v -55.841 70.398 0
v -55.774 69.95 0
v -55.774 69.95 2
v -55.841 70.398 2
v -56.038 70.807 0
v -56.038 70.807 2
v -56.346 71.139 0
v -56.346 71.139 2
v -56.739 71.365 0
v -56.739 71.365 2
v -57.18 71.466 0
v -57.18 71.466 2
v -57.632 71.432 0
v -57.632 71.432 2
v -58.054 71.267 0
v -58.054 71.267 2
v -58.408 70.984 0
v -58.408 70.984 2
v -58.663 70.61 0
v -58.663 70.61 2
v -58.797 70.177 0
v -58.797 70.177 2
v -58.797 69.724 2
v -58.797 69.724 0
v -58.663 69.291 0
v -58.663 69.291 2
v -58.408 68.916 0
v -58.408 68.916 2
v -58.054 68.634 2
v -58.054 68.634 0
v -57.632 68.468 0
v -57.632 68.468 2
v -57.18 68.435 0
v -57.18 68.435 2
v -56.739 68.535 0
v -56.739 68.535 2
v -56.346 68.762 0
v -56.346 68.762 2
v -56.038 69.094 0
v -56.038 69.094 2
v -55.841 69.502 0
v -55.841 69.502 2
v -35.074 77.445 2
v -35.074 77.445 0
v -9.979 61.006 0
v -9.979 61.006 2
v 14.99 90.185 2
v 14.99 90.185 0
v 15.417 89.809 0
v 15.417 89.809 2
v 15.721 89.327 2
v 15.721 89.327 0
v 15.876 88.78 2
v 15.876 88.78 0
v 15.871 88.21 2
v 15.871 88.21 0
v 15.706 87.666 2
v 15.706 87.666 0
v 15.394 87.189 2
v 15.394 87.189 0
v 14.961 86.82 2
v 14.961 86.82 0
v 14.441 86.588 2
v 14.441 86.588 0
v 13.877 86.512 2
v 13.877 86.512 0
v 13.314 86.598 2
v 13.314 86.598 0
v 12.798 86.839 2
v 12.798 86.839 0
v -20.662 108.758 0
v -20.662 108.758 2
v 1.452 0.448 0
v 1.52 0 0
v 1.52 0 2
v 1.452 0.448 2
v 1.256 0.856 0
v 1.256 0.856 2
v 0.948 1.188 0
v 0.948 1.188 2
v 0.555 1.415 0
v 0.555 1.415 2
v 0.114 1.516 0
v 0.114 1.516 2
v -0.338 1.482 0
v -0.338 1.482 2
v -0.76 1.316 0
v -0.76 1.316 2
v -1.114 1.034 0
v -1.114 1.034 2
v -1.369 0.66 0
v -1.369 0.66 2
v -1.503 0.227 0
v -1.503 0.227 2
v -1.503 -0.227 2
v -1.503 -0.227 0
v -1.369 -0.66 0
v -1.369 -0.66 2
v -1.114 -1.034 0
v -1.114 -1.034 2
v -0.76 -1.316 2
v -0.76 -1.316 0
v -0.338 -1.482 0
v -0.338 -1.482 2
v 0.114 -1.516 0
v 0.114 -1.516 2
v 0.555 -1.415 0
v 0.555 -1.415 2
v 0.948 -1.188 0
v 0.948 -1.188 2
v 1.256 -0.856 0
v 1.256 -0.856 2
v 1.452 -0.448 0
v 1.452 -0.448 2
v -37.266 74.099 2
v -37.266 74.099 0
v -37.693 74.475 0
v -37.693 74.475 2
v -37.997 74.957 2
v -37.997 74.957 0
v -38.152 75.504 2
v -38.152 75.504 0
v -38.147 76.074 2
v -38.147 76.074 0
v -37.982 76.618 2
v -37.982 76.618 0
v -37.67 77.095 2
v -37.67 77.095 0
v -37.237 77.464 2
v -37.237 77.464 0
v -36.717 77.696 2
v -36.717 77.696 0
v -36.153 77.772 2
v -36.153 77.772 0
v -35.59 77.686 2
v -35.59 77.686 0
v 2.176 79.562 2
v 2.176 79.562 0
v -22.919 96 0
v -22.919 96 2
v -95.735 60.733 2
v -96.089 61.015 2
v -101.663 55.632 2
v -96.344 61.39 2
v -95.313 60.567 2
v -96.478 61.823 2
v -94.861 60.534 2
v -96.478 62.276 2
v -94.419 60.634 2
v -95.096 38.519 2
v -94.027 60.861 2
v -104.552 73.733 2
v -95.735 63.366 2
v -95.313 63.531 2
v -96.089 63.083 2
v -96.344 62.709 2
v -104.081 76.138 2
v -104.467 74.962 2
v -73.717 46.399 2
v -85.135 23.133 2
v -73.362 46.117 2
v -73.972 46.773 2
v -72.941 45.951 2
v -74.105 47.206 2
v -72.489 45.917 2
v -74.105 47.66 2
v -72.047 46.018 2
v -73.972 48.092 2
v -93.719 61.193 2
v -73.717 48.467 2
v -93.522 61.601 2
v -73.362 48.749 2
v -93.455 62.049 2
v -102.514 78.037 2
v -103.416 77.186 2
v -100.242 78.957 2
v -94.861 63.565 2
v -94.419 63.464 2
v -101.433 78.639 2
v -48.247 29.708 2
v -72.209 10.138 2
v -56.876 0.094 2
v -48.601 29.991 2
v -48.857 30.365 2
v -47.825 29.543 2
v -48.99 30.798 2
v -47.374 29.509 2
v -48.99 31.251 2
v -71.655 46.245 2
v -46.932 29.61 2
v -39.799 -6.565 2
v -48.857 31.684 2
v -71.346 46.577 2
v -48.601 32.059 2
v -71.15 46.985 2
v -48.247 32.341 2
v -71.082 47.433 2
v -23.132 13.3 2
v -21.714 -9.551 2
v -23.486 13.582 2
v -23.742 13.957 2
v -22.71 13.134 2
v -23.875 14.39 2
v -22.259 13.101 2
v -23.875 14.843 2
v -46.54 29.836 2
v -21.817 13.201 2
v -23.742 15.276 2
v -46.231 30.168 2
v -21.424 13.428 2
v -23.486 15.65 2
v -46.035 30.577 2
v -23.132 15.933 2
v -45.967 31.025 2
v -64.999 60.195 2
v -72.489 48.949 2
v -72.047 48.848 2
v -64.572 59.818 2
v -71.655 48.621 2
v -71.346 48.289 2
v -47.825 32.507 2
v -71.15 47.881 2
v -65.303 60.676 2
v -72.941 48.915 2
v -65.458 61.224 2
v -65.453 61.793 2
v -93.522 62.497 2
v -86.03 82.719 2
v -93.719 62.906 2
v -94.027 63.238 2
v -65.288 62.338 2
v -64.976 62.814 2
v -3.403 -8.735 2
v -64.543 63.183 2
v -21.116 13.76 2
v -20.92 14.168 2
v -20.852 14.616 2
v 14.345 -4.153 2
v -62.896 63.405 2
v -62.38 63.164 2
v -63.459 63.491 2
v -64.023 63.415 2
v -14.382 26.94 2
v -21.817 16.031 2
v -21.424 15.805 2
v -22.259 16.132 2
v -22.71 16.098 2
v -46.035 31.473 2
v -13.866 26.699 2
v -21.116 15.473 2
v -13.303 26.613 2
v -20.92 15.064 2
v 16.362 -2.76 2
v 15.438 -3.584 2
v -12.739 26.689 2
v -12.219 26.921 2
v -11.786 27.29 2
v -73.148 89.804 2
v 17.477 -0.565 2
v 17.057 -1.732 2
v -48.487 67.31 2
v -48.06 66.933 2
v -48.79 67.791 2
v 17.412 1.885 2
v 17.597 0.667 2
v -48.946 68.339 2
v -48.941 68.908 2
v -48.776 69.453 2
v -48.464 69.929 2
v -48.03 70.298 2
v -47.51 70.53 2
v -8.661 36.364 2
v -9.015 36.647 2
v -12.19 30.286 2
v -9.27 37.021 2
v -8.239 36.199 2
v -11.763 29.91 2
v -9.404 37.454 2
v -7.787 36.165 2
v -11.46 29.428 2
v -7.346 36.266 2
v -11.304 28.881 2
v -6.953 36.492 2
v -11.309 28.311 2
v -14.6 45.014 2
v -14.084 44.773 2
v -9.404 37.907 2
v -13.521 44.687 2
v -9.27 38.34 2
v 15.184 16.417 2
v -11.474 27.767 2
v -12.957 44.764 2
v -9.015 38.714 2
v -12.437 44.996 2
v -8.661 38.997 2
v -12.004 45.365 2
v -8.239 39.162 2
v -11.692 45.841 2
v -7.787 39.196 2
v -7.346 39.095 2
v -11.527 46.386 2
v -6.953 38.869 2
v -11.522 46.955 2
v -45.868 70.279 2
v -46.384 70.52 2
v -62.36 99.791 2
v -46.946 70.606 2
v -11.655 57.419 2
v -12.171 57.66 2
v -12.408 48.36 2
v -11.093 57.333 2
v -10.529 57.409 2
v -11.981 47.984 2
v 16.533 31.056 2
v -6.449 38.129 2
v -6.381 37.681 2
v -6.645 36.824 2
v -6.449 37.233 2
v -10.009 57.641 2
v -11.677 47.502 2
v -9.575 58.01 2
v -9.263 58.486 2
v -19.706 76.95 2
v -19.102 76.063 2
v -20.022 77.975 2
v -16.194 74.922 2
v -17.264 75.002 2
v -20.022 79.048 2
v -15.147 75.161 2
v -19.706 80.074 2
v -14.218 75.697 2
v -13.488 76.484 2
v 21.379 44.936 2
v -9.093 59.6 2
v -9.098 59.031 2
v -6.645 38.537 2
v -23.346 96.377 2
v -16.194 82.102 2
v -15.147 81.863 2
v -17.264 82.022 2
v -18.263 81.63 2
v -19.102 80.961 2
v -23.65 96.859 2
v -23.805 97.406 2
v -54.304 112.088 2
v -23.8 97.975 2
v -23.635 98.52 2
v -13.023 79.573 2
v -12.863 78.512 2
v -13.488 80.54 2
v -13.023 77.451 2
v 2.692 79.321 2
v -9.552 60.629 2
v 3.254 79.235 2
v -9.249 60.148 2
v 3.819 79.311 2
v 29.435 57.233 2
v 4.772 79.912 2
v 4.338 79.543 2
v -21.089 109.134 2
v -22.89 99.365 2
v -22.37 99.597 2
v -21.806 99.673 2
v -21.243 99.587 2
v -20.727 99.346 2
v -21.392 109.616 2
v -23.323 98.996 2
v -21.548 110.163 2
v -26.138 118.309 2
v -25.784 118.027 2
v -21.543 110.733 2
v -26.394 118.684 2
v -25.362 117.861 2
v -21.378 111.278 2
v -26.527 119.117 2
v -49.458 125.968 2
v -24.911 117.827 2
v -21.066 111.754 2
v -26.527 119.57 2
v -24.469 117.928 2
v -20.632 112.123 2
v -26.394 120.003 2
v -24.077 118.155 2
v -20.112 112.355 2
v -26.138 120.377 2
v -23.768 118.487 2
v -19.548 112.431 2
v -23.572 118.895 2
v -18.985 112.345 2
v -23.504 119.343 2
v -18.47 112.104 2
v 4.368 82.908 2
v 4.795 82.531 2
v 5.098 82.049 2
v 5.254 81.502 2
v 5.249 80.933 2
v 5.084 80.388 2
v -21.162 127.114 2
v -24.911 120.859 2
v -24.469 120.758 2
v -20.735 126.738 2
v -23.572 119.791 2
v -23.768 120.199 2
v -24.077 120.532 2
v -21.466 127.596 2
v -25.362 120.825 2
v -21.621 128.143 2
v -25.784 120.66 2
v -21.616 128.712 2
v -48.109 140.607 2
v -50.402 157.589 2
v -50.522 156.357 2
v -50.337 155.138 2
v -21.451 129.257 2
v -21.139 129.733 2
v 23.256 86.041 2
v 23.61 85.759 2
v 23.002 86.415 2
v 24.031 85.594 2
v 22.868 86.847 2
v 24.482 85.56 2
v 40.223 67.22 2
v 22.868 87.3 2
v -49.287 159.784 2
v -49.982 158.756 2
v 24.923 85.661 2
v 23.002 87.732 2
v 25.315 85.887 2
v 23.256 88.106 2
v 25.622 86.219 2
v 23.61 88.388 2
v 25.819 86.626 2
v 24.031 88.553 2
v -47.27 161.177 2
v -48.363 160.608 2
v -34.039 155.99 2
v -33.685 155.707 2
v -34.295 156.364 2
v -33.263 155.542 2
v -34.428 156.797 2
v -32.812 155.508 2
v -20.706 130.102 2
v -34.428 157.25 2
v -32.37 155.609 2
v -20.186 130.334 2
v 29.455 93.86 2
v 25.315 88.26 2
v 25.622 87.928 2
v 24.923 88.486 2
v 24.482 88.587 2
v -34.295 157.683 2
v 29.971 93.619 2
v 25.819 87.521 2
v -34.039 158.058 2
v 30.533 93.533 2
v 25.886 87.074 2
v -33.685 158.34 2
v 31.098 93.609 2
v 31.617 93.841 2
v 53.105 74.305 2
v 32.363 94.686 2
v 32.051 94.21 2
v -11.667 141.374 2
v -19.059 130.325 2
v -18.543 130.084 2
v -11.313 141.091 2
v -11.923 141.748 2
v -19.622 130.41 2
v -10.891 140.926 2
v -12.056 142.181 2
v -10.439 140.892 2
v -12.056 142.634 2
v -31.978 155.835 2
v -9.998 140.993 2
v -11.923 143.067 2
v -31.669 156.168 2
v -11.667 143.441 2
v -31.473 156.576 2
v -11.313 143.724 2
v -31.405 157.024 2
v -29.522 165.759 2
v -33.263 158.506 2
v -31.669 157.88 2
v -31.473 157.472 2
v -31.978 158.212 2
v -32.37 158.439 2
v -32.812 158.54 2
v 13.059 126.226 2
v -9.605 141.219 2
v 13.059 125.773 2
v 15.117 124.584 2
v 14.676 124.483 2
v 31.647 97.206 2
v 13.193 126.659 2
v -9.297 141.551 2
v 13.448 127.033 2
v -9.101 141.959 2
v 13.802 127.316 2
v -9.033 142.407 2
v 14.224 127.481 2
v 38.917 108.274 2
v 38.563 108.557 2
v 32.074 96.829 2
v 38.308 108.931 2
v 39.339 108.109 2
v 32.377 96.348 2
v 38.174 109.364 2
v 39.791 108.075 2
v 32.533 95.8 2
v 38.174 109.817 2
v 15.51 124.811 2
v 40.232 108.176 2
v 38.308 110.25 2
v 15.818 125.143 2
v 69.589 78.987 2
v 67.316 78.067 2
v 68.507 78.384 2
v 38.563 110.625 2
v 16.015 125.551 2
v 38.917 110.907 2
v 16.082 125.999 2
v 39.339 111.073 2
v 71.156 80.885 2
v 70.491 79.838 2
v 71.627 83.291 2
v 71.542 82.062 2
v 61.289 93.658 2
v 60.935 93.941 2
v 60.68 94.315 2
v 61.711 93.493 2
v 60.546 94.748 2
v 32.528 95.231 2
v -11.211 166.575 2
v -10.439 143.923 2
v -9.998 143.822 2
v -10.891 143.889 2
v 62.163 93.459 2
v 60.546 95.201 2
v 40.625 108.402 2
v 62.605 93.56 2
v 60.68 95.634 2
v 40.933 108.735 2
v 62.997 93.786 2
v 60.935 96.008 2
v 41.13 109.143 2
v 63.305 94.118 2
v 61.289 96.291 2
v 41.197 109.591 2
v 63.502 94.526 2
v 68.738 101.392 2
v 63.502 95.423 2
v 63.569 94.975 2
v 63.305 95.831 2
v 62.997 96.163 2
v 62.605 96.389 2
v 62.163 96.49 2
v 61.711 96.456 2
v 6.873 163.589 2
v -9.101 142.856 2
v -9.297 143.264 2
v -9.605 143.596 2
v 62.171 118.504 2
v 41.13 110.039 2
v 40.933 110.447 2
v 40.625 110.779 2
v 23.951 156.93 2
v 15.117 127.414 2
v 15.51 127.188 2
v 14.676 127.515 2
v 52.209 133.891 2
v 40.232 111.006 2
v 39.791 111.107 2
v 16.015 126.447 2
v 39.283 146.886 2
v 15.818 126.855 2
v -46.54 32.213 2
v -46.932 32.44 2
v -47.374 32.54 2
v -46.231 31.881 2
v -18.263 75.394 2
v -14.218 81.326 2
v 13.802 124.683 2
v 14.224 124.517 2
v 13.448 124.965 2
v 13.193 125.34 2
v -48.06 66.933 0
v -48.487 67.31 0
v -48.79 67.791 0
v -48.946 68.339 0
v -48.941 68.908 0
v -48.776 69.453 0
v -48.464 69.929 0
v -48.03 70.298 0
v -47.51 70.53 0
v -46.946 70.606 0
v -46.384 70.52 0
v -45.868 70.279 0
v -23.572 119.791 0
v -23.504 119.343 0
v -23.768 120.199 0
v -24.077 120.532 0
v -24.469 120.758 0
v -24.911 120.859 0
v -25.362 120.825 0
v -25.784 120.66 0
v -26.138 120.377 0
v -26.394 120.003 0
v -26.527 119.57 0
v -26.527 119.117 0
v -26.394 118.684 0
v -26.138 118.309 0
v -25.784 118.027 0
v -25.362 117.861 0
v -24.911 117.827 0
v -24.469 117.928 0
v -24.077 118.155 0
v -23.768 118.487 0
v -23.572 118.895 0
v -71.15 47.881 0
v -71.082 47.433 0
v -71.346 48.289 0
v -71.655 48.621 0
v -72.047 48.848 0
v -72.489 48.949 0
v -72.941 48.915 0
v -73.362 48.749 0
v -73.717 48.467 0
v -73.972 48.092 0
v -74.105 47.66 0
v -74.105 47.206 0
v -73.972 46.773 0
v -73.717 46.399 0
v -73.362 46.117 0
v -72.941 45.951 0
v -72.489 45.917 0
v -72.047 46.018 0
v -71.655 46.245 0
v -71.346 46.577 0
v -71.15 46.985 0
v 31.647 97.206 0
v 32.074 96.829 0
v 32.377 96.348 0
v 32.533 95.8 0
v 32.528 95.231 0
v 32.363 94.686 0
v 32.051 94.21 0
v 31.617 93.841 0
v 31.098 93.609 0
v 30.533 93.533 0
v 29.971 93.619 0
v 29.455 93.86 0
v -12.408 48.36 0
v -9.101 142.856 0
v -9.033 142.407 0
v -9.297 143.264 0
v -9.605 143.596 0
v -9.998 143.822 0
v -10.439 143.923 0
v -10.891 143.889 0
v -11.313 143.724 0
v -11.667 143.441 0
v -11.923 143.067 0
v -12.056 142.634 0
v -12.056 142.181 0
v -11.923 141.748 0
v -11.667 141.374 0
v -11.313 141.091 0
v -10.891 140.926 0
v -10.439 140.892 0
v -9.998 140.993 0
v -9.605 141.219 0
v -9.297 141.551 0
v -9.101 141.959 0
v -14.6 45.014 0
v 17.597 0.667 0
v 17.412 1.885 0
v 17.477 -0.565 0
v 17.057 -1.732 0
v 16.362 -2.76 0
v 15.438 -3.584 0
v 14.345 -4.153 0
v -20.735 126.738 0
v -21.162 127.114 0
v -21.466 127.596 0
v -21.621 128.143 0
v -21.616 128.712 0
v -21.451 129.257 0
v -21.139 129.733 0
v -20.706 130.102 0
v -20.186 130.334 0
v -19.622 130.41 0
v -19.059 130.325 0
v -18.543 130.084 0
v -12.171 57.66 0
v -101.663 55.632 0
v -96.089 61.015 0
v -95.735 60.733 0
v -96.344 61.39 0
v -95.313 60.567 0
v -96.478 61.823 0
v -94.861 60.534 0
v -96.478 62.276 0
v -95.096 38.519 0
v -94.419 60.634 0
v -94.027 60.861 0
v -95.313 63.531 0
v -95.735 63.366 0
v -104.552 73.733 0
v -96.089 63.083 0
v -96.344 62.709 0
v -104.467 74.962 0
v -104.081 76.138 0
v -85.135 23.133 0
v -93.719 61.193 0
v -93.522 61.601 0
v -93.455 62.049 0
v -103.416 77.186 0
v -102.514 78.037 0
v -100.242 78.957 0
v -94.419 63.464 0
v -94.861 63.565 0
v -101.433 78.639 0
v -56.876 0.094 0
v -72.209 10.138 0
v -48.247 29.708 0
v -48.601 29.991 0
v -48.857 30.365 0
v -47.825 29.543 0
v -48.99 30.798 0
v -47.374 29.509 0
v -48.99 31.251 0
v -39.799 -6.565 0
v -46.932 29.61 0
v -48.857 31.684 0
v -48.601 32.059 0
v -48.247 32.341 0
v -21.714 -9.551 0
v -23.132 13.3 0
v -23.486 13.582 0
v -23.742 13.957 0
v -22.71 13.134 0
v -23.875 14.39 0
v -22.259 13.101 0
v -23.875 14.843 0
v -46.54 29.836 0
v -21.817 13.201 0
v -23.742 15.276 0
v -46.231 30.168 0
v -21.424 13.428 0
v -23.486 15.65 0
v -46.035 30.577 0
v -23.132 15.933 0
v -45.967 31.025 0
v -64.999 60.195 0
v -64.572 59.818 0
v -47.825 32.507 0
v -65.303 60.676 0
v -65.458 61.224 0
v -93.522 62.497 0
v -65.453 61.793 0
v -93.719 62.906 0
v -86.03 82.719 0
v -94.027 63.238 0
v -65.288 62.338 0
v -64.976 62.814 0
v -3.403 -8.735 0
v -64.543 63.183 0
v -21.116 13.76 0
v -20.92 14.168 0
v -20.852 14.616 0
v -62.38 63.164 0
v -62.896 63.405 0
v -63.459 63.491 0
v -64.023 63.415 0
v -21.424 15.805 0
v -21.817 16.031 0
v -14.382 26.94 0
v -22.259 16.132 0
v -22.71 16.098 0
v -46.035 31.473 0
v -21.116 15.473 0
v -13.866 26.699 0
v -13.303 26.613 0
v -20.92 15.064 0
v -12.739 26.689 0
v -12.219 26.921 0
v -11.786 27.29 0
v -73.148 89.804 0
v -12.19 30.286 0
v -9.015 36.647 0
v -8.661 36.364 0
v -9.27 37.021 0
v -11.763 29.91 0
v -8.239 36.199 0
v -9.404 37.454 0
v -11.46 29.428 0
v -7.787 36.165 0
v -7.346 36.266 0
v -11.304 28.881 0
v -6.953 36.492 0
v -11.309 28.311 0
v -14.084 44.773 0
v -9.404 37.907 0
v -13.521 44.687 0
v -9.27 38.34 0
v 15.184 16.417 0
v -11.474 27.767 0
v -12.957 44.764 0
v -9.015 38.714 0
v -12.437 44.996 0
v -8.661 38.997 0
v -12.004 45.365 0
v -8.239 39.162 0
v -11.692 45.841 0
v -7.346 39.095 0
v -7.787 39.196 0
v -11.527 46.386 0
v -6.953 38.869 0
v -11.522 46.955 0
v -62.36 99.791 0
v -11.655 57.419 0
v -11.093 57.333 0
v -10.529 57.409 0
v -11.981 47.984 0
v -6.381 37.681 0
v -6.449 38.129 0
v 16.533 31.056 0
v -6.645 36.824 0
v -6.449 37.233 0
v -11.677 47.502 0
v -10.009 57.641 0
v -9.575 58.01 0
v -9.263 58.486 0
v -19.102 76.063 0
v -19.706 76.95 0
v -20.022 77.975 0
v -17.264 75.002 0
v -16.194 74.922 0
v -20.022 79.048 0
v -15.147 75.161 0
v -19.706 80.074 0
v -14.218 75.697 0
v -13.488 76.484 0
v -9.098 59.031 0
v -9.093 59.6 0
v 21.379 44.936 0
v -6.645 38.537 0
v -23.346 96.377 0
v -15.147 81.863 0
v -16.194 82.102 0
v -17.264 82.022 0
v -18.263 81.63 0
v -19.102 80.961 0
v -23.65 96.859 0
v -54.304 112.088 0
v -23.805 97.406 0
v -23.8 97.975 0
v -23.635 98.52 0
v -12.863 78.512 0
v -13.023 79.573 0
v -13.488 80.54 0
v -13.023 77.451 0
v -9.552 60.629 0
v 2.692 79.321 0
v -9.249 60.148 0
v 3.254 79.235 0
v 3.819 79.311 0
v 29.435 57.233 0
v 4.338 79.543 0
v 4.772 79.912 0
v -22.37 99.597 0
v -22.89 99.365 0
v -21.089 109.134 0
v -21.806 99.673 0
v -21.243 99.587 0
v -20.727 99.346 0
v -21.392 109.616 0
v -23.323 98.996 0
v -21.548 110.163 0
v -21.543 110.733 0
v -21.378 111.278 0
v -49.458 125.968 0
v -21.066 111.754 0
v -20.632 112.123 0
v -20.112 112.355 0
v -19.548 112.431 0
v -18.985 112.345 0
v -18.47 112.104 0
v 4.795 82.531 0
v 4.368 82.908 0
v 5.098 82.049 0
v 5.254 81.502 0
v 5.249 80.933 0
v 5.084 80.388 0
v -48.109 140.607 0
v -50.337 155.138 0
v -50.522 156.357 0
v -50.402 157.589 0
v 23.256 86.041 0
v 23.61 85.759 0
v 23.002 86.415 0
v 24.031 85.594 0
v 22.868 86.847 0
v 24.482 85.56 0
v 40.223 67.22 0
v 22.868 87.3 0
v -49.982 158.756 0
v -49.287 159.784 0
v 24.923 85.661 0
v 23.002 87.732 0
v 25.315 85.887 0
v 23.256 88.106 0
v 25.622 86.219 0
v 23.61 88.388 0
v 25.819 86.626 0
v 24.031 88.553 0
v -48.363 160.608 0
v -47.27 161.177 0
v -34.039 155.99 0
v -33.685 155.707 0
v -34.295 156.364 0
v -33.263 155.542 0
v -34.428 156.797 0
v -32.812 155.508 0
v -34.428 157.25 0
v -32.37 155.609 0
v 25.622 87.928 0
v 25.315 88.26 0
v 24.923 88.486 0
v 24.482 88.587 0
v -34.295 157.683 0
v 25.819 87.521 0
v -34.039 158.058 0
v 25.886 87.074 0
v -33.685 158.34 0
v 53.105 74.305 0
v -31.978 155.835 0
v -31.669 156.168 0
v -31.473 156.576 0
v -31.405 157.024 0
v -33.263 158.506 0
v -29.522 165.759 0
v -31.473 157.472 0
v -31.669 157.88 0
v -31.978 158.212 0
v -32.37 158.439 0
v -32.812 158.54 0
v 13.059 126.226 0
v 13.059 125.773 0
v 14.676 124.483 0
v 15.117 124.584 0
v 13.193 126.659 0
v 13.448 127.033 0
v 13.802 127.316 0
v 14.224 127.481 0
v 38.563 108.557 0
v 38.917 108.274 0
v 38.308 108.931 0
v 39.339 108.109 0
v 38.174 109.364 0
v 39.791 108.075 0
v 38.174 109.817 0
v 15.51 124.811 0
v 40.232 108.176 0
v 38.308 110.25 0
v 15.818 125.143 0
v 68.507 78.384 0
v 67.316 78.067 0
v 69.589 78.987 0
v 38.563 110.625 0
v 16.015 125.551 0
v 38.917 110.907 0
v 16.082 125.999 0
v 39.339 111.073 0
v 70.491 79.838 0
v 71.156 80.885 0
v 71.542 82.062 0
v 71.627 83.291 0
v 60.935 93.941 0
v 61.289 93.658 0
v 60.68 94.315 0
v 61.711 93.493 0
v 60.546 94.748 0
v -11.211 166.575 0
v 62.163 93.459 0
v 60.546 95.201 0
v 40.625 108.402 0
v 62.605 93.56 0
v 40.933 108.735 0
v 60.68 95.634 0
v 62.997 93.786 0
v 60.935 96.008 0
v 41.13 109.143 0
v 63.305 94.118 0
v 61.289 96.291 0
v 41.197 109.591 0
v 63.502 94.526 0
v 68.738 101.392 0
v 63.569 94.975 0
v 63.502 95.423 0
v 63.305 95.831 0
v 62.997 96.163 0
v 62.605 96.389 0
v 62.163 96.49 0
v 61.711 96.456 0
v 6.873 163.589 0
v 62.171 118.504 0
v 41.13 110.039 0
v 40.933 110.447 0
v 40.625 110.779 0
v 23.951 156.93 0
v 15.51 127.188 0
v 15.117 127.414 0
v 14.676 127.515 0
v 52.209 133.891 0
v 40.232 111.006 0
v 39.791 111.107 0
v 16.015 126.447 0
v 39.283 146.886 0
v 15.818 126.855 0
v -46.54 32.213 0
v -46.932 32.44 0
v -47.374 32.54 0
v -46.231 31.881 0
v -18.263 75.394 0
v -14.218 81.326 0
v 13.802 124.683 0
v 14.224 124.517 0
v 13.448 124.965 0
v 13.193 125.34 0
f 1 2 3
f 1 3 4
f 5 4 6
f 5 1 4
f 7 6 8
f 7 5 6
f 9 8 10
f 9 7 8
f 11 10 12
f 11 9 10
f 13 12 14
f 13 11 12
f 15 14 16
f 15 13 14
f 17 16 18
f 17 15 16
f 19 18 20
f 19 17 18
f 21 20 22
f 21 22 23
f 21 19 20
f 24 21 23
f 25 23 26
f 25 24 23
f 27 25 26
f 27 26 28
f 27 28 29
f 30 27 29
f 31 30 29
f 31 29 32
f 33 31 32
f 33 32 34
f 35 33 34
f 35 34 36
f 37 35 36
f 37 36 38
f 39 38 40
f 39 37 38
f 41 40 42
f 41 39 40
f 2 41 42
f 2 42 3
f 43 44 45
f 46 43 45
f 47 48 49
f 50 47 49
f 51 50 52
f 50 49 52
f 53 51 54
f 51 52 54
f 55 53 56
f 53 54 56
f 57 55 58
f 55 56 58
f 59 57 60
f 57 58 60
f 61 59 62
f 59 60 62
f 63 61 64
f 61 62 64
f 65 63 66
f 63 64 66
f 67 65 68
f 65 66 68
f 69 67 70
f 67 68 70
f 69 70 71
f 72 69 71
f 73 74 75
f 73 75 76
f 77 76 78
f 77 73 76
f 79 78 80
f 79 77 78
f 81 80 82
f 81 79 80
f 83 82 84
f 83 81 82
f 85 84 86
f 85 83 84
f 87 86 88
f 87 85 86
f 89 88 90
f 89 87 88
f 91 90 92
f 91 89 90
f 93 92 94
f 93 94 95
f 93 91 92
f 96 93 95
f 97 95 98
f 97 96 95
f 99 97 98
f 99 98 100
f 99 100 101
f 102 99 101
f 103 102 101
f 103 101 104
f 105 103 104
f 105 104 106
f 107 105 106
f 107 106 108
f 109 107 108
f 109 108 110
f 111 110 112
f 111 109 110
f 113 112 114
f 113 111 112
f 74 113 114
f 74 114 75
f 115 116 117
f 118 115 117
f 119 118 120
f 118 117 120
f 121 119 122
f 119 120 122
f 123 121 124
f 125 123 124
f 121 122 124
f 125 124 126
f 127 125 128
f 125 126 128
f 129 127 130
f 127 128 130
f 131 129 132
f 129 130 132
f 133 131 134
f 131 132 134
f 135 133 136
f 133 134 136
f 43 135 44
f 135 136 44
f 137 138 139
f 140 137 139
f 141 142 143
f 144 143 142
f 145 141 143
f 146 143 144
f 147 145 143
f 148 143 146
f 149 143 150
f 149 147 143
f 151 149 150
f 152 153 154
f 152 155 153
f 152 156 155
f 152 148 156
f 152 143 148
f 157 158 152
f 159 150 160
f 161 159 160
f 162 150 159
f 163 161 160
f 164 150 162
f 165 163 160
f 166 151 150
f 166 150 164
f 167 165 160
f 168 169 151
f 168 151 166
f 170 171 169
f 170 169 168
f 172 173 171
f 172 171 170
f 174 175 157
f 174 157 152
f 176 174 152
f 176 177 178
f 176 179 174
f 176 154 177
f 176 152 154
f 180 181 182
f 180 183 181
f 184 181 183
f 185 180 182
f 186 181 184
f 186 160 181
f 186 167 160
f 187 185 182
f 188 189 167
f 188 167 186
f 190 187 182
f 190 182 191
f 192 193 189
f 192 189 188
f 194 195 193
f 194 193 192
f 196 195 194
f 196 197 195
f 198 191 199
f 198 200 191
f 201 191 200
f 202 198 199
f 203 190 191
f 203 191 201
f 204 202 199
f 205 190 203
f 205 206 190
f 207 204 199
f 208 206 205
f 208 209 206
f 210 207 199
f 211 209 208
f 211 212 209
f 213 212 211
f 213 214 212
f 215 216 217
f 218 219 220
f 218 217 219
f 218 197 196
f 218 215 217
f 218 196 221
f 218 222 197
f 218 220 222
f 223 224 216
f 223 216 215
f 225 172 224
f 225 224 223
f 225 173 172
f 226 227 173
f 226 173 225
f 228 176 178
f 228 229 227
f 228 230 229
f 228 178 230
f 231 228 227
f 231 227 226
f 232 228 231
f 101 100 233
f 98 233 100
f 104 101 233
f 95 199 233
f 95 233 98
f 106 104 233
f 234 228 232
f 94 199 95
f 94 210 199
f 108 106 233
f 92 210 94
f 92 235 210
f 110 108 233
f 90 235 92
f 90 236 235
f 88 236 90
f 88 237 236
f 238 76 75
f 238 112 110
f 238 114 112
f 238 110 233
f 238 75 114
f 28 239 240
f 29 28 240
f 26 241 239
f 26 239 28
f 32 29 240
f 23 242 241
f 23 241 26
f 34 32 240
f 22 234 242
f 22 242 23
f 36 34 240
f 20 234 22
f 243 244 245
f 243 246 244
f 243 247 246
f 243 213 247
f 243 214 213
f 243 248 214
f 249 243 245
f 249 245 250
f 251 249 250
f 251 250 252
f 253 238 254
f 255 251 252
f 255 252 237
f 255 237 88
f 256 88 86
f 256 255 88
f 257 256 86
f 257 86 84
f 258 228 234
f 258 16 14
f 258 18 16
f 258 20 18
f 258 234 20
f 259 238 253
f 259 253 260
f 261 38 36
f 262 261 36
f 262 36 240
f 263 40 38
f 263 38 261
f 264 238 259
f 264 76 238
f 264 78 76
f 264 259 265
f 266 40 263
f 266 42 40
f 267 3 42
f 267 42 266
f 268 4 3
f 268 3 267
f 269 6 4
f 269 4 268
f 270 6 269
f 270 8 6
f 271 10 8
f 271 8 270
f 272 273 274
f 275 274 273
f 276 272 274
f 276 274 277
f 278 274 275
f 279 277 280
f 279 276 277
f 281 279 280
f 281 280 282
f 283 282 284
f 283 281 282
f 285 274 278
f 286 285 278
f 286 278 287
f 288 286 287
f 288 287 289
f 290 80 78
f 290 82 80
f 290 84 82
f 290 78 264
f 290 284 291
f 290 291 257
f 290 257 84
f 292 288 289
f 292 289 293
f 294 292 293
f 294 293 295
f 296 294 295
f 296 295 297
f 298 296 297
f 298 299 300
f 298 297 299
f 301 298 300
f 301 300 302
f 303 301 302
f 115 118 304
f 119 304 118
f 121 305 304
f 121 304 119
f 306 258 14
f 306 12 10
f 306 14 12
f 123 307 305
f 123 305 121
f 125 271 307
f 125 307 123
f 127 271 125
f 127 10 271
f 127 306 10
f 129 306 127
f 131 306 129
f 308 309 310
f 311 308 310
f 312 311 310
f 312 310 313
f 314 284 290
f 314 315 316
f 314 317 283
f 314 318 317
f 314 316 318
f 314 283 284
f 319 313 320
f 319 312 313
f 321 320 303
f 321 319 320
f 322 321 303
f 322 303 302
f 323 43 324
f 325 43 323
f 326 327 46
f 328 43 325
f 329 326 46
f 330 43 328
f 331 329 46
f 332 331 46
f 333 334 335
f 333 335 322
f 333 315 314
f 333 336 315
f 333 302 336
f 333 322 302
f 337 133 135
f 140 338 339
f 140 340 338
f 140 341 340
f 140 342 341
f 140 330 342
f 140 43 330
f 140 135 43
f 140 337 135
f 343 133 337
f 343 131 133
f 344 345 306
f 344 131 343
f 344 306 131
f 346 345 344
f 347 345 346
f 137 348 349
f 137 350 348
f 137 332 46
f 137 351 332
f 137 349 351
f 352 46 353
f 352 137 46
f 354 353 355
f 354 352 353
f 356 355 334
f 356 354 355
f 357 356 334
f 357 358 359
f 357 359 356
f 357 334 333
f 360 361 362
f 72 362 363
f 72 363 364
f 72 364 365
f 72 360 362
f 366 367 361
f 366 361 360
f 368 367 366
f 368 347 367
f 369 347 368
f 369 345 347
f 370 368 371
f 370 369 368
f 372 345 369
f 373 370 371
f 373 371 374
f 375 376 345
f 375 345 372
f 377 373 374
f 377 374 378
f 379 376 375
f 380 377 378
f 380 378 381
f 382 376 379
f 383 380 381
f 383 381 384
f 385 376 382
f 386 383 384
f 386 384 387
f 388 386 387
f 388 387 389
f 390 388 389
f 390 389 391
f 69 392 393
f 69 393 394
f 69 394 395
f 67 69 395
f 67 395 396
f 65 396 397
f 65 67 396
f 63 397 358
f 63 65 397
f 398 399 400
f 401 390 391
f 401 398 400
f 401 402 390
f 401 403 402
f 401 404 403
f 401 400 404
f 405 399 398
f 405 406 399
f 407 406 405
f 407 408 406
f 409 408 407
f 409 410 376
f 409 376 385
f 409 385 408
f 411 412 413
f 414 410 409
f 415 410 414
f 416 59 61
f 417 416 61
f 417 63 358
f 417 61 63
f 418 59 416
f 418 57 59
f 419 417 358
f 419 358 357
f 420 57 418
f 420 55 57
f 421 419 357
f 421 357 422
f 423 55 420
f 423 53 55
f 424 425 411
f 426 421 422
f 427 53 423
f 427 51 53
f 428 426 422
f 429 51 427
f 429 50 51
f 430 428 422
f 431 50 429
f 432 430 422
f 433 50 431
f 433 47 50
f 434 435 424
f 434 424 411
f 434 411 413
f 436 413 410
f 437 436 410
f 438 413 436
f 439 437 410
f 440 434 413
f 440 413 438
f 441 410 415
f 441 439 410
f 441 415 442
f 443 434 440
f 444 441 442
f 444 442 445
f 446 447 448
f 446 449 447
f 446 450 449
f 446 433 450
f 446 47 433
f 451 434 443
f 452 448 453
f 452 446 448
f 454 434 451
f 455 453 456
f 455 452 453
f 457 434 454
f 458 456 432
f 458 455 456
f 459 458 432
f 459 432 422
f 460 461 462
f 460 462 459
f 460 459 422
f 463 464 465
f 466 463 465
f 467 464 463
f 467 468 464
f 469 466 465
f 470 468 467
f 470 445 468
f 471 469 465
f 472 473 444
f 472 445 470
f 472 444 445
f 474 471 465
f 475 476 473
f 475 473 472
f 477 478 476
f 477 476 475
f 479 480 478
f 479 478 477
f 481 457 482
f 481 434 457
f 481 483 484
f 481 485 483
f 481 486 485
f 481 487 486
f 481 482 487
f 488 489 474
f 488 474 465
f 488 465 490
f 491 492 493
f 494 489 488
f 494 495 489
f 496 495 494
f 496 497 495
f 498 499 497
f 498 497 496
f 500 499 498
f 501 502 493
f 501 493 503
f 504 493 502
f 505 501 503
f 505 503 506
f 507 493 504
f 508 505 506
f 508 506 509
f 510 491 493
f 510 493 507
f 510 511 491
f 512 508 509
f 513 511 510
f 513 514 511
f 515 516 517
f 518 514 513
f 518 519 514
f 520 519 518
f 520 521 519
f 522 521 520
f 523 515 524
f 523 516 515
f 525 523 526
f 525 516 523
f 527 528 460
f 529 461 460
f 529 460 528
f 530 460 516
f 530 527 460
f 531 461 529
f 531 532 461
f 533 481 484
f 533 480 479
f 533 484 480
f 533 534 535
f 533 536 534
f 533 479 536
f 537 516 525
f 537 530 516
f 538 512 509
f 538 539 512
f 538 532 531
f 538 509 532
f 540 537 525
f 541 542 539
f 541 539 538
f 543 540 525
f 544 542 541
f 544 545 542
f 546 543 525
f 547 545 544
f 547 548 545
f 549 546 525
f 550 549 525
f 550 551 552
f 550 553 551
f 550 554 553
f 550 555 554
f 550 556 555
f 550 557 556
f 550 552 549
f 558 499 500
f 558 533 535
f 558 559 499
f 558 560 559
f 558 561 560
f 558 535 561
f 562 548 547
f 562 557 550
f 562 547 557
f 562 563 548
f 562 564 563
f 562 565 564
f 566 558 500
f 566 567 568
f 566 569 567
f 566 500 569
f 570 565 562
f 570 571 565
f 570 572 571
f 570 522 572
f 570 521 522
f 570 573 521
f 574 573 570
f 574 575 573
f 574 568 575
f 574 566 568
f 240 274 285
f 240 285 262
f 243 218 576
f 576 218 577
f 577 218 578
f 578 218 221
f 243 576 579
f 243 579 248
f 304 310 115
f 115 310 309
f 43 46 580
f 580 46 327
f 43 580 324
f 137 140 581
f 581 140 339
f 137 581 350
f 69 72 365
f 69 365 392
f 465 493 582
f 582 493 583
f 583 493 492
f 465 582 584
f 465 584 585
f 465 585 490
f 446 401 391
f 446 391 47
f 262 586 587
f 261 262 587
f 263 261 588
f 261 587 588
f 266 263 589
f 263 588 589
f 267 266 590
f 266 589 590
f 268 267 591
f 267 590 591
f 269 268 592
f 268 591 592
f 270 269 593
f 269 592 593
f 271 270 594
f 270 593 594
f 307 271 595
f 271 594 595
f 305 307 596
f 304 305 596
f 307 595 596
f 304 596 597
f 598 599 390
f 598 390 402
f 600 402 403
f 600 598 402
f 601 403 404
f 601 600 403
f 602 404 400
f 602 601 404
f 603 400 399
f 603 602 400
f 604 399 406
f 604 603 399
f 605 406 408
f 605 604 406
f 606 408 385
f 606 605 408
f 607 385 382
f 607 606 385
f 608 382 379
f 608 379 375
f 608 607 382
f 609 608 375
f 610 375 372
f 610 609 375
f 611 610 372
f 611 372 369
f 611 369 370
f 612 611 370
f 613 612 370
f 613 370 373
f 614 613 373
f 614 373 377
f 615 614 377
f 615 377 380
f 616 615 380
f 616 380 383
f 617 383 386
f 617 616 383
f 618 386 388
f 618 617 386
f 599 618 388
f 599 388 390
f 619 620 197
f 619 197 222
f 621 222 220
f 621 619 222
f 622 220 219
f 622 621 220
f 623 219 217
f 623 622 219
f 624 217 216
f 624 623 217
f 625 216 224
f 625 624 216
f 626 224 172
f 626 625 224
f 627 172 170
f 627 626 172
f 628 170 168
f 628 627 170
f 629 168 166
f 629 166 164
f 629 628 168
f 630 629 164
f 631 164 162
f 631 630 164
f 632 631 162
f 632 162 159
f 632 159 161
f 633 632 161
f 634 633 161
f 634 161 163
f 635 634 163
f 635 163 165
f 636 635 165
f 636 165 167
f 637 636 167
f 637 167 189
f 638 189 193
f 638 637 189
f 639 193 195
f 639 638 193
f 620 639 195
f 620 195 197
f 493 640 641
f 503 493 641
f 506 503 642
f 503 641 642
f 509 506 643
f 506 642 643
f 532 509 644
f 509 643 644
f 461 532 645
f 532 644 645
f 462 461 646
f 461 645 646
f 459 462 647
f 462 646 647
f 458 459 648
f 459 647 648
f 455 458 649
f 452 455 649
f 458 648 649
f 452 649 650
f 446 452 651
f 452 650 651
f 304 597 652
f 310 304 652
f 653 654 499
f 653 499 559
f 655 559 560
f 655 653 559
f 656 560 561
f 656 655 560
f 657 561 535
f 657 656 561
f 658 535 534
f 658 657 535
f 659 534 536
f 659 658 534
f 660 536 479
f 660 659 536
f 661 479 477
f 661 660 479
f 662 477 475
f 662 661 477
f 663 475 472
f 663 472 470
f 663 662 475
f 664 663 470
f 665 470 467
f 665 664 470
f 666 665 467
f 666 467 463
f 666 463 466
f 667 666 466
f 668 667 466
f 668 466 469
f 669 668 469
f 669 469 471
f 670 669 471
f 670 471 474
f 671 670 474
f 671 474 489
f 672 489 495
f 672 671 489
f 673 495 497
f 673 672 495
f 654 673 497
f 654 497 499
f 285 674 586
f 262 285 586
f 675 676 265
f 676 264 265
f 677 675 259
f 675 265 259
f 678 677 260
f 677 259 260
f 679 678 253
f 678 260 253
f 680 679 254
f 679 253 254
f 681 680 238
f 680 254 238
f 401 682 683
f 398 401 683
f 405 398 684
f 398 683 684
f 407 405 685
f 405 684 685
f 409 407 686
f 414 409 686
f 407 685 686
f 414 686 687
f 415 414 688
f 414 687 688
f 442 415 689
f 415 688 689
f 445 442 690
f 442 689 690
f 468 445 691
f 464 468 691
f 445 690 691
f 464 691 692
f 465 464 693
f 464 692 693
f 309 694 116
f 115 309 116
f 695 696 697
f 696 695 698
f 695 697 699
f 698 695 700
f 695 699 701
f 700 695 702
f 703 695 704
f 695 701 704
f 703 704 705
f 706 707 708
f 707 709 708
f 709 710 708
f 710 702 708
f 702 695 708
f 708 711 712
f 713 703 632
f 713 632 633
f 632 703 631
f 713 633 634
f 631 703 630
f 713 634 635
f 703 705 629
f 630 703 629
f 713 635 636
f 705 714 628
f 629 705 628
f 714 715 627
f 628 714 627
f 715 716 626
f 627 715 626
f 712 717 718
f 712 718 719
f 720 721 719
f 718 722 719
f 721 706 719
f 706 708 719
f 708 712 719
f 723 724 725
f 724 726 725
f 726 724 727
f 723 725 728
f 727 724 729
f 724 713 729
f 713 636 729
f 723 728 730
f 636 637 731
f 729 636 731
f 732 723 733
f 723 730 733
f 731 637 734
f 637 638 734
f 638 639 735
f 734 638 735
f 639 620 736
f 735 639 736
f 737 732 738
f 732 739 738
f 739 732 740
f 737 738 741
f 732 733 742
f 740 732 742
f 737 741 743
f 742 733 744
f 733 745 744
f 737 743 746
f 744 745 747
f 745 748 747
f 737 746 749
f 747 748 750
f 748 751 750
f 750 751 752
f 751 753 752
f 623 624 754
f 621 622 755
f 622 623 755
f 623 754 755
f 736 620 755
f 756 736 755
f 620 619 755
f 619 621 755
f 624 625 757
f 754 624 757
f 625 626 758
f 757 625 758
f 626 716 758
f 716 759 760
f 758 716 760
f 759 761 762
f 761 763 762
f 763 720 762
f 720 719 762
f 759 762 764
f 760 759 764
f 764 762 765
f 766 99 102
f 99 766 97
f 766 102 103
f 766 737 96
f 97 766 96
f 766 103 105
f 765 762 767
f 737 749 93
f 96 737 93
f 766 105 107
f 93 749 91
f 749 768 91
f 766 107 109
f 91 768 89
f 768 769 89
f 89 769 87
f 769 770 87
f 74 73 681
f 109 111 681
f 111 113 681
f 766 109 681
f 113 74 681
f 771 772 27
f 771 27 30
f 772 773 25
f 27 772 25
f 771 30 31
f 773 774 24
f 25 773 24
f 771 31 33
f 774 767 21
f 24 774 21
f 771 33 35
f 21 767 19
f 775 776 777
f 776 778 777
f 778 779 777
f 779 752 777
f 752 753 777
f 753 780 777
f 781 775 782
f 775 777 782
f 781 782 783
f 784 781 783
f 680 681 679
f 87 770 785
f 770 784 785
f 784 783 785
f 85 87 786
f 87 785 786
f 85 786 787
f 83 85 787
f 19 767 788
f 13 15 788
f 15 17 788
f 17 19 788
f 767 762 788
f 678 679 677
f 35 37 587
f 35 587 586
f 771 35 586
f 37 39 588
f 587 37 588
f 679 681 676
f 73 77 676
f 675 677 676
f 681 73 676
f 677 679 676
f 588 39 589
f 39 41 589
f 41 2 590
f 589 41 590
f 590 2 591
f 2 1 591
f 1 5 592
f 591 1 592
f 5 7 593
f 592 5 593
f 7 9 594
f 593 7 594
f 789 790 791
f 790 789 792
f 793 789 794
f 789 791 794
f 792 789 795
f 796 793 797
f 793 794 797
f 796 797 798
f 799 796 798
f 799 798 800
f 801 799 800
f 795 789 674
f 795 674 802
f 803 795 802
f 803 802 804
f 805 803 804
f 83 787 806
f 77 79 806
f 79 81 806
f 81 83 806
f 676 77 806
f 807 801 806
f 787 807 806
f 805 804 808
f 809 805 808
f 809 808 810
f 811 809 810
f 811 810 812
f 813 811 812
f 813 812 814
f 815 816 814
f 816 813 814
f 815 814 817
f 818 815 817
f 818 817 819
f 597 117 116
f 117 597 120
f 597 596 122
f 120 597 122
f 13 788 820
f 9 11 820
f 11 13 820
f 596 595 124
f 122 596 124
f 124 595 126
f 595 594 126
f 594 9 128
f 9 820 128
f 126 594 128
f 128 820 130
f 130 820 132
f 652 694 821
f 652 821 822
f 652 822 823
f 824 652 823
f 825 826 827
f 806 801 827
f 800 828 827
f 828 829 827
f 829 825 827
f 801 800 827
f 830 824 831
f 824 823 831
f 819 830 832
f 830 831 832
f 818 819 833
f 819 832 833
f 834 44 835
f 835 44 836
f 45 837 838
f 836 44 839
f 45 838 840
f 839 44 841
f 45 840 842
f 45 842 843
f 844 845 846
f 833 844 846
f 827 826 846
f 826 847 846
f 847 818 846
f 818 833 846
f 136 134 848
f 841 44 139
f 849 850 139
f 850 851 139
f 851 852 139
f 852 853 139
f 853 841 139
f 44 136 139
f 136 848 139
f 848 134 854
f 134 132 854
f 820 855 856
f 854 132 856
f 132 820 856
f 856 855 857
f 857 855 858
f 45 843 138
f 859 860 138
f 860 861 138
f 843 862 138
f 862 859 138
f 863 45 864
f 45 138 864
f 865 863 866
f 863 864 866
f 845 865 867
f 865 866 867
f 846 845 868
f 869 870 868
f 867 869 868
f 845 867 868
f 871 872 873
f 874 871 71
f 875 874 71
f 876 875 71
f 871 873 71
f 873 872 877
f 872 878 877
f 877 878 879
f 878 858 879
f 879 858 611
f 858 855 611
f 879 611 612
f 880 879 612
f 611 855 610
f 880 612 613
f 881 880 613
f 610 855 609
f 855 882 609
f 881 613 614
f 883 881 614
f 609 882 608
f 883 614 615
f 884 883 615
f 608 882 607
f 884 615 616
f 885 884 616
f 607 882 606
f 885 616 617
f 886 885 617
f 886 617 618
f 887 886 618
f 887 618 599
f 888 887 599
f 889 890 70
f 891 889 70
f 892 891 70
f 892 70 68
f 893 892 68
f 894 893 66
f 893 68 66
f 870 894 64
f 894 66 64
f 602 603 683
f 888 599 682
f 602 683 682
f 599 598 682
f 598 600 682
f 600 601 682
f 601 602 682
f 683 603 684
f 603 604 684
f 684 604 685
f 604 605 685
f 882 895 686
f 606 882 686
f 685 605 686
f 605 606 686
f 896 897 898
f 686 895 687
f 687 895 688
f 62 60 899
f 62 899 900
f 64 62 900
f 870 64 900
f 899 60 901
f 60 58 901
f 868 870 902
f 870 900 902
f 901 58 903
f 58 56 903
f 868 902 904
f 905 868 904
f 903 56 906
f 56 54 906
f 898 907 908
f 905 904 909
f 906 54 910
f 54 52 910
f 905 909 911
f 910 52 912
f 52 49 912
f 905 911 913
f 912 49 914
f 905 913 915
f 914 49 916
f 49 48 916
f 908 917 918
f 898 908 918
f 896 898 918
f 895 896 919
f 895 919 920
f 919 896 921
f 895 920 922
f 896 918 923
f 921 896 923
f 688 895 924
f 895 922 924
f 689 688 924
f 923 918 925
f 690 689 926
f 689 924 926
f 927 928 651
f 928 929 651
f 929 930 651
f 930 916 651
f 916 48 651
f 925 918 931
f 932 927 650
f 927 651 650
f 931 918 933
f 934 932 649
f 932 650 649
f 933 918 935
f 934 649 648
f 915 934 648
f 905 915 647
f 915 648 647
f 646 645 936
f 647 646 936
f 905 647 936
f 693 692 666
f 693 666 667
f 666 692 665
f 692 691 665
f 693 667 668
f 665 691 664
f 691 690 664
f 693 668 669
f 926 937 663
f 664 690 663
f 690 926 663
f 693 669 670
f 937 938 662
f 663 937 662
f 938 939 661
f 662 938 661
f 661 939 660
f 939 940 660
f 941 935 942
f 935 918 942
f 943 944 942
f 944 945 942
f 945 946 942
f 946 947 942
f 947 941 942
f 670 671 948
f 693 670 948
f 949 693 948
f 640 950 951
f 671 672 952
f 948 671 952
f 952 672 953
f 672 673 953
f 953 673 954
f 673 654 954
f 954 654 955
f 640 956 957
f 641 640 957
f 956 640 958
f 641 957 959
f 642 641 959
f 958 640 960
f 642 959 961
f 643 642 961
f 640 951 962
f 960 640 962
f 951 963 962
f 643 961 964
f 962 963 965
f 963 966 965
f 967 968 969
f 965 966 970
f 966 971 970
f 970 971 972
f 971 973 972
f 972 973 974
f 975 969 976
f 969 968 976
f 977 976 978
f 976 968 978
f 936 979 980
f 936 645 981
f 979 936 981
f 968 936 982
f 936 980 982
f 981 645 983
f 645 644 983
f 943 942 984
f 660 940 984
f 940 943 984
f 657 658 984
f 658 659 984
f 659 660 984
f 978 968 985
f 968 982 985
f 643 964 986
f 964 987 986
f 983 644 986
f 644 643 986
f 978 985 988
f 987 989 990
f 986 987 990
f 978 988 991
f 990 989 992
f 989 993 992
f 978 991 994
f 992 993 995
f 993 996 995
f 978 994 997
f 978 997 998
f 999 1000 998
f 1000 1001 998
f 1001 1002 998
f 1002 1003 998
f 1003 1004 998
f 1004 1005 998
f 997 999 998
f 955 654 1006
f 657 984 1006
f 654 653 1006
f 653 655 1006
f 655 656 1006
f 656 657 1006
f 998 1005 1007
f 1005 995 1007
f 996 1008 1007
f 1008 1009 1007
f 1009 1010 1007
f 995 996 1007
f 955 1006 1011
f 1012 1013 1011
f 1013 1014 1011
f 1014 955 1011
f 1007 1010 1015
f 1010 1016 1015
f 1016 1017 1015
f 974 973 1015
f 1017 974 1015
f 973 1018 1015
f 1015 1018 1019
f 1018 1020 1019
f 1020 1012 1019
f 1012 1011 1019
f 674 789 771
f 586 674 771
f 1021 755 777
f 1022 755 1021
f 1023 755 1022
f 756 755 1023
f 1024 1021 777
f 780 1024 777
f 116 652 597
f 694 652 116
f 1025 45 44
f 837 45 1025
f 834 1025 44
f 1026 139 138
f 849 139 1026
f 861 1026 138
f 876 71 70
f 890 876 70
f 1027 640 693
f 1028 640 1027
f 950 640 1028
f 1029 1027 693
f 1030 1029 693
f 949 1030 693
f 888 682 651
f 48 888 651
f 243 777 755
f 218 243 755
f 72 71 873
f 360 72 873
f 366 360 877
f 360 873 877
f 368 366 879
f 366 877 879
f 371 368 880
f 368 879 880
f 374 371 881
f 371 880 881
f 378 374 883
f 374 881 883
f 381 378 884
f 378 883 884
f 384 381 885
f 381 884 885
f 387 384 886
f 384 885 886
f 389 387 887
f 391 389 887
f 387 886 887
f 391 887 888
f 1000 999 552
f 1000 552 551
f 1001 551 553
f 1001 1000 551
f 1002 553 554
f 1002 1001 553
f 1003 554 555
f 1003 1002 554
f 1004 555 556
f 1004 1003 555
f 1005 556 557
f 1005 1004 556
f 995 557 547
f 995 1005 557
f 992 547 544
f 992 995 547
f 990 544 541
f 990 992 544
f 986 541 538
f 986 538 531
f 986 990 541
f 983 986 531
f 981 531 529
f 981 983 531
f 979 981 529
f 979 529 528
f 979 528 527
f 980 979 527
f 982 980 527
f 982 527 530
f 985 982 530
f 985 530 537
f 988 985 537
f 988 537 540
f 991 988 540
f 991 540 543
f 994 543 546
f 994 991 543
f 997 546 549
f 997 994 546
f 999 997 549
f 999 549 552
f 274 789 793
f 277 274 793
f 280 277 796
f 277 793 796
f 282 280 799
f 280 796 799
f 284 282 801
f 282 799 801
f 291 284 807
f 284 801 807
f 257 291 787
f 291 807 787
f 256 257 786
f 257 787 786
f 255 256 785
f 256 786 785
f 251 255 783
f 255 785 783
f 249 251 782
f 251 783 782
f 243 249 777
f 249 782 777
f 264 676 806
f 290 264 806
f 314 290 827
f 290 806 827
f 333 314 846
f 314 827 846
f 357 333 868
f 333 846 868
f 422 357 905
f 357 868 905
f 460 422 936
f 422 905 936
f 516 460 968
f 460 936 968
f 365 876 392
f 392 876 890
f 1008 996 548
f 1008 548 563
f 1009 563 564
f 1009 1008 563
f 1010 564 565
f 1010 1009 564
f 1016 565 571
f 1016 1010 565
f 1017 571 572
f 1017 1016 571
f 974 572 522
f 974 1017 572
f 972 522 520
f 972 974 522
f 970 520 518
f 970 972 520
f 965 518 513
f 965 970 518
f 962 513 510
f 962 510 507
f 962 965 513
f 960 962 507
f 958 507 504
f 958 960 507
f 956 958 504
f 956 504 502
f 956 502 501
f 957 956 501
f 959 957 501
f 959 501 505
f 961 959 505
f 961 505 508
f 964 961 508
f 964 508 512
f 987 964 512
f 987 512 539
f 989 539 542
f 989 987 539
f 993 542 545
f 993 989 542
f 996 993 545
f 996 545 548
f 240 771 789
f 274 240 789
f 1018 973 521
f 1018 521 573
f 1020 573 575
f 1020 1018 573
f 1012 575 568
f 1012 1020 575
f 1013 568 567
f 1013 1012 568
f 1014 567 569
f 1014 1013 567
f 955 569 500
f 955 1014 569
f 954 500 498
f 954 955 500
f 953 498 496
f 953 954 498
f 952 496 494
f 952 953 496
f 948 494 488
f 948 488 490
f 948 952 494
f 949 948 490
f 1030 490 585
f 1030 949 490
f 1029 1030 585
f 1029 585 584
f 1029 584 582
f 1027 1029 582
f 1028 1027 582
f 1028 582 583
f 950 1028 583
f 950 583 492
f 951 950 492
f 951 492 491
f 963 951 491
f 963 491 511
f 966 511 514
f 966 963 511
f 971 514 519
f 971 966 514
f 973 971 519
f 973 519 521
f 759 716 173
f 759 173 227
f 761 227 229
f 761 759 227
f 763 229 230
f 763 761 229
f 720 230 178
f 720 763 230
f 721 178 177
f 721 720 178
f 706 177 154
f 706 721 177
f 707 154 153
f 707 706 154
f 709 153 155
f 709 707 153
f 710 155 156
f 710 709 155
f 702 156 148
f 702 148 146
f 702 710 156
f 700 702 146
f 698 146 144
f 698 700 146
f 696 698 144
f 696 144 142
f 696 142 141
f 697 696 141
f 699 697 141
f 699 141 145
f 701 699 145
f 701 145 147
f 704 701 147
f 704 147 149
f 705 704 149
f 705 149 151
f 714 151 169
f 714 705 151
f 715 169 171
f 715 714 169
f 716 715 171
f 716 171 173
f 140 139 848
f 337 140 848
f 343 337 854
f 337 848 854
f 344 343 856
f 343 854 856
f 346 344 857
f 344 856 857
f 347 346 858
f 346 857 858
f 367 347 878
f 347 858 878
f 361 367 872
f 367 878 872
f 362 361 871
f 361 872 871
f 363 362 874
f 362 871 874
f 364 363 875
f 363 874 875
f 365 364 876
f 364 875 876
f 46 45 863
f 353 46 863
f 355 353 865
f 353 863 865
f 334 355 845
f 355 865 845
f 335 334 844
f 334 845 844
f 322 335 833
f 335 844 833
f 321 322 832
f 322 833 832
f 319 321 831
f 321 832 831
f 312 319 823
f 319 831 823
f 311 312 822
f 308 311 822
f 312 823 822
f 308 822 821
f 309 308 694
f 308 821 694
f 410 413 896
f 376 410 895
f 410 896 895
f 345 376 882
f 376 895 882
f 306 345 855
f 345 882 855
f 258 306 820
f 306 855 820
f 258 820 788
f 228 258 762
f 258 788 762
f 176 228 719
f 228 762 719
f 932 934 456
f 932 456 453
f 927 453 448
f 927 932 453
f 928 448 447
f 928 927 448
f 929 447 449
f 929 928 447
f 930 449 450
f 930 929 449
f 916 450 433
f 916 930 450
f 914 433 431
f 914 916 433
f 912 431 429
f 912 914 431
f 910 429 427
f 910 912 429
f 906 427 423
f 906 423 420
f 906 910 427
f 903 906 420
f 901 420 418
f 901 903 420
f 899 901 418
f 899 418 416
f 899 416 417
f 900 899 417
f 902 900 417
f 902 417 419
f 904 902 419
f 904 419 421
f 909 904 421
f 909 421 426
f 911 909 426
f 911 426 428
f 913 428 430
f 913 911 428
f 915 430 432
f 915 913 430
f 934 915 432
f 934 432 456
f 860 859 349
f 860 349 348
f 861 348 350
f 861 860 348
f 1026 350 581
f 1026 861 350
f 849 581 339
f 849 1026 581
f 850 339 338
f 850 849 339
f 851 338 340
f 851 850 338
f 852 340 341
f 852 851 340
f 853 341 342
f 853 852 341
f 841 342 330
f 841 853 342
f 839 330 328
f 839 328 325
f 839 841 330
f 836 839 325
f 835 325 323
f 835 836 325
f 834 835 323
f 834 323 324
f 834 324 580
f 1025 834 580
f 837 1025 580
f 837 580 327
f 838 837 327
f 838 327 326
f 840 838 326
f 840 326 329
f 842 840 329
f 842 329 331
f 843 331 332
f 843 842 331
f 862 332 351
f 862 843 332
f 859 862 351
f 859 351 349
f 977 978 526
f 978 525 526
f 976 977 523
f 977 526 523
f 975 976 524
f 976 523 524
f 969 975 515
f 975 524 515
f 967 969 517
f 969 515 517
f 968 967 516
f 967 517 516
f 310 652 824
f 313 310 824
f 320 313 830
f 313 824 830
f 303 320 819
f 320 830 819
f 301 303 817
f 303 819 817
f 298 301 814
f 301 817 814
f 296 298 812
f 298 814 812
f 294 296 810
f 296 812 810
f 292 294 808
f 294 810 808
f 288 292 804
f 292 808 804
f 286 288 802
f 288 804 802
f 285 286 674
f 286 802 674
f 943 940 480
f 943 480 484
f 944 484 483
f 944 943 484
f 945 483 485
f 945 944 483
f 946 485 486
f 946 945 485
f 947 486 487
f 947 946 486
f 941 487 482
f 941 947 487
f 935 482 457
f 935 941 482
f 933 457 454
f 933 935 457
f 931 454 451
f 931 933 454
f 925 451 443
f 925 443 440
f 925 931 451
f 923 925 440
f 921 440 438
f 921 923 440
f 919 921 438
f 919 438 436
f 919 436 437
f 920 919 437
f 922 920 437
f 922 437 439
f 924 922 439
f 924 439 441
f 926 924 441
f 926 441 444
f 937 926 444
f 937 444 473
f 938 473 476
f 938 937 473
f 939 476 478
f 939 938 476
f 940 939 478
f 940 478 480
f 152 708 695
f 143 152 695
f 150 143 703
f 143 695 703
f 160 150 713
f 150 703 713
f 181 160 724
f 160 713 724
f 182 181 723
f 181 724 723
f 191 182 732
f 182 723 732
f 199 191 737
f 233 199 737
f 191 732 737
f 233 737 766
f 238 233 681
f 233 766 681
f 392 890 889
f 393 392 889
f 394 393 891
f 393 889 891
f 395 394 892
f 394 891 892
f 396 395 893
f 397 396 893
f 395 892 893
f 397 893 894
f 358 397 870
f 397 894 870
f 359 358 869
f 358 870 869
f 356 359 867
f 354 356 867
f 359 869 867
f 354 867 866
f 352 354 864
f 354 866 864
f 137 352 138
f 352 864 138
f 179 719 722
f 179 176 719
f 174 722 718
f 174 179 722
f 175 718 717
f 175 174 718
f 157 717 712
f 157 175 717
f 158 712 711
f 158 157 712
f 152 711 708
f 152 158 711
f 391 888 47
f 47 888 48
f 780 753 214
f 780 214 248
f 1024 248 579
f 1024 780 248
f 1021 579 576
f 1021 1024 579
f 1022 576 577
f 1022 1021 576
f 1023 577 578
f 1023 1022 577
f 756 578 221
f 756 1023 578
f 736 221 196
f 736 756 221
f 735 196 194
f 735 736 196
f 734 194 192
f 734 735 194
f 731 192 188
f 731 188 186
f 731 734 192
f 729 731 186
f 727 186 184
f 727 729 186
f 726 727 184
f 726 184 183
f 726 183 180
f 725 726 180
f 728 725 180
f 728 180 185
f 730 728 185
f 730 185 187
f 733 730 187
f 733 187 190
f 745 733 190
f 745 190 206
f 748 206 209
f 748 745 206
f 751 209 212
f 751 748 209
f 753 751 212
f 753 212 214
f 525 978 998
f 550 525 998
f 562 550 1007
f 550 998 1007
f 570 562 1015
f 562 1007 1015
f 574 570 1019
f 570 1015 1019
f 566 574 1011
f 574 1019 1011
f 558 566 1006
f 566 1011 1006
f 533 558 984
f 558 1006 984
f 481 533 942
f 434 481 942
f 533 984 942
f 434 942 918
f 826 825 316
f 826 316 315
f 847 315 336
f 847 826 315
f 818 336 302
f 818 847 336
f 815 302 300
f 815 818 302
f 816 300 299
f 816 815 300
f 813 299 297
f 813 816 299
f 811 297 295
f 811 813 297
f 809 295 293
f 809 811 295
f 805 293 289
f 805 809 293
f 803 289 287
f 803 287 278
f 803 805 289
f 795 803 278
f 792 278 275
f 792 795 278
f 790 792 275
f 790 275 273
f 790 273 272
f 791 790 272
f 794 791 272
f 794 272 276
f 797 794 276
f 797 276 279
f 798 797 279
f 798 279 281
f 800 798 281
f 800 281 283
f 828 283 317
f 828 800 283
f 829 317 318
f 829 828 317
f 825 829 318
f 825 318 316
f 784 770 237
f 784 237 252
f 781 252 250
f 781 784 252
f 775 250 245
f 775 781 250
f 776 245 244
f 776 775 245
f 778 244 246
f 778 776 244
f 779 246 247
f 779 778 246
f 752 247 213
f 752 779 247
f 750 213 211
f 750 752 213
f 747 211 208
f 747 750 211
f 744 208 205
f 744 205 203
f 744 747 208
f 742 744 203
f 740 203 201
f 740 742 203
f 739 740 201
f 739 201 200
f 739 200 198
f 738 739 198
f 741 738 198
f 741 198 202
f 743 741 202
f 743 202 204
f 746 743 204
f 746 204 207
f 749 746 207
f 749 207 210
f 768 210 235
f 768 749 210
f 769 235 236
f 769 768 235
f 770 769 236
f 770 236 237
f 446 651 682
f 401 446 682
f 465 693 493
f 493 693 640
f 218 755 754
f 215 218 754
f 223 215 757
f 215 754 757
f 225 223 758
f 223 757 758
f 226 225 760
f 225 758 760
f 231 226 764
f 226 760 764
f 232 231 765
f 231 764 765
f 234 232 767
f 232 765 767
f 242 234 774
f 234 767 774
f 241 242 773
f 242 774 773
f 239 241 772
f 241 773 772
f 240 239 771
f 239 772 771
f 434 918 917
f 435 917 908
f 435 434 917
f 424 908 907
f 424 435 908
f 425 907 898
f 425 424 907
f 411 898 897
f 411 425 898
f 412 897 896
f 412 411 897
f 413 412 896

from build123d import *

# Parameters (mm, degrees)
SKETCH_1_R      = 1.52
SKETCH_1_R_2    = 1.519999991
SKETCH_1_R_3    = 1.520000009
SKETCH_1_R_4    = 1.520000002
SKETCH_1_R_5    = 3.6
SKETCH_1_R_6    = 1.517381685
SKETCH_1_R_7    = 1.519999997
EXTRUDE_1_DEPTH = 2
FILLET_1_R      = 5


with BuildPart() as part:
    # 草图1 → 凸台-拉伸1 (new body)
    with BuildSketch(Plane.XY):
        with BuildLine():
            ThreePointArc((71.75669201, 78.511901277), (31.878575622, 152.307394815), (-51.703250679, 159.386755327))
            ThreePointArc((-51.703250679, 159.386755327), (-57.956662012, 105.693394177), (-104.68190817, 78.511901277))
            ThreePointArc((-104.68190817, 78.511901277), (-64.803791783, 4.716407738), (18.778034519, -2.362952773))
            ThreePointArc((18.778034519, -2.362952773), (25.031445851, 51.330408377), (71.75669201, 78.511901277))
        make_face()
        with Locations((-94.974509357, 62.049293197)):
            Circle(SKETCH_1_R, mode=Mode.SUBTRACT)
        Circle(SKETCH_1_R, mode=Mode.SUBTRACT)
        with Locations((-32.925216161, 157.023802554)):
            Circle(SKETCH_1_R, mode=Mode.SUBTRACT)
        with Locations((62.049293197, 94.974509357)):
            Circle(SKETCH_1_R, mode=Mode.SUBTRACT)
        with Locations((-47.487254679, 31.024646598)):
            Circle(SKETCH_1_R_2, mode=Mode.SUBTRACT)
        with Locations((-22.372181549, 14.61632244)):
            Circle(SKETCH_1_R_3, mode=Mode.SUBTRACT)
        with Locations((-72.602327809, 47.432970756)):
            Circle(SKETCH_1_R_3, mode=Mode.SUBTRACT)
        with BuildLine():
            ThreePointArc((-12.190085291, 30.286229165), (-11.613016331, 27.517295901), (-14.381949595, 26.940226942))
            Line((-14.381949595, 26.940226942), (-64.57198293, 59.818191506))
            ThreePointArc((-64.57198293, 59.818191506), (-65.149051889, 62.587124769), (-62.380118626, 63.164193728))
            Line((-62.380118626, 63.164193728), (-12.190085291, 30.286229165))
        make_face(mode=Mode.SUBTRACT)
        with Locations((-57.293948747, 69.950264788)):
            Circle(SKETCH_1_R_4, mode=Mode.SUBTRACT)
        with BuildLine():
            ThreePointArc((-12.40781803, 48.360410386), (-11.830749071, 45.591477123), (-14.599682334, 45.014408164))
            Line((-14.599682334, 45.014408164), (-48.059704557, 66.933051206))
            ThreePointArc((-48.059704557, 66.933051206), (-48.636773516, 69.70198447), (-45.867840253, 70.279053429))
            Line((-45.867840253, 70.279053429), (-12.40781803, 48.360410386))
        make_face(mode=Mode.SUBTRACT)
        with BuildLine():
            ThreePointArc((-9.979365756, 61.005797168), (-9.402296797, 58.236863905), (-12.17123006, 57.659794946))
            Line((-12.17123006, 57.659794946), (-37.266246728, 74.098777228))
            ThreePointArc((-37.266246728, 74.098777228), (-37.843315687, 76.867710491), (-35.074382424, 77.44477945))
            Line((-35.074382424, 77.44477945), (-9.979365756, 61.005797168))
        make_face(mode=Mode.SUBTRACT)
        with Locations((-7.900971591, 37.68056061)):
            Circle(SKETCH_1_R, mode=Mode.SUBTRACT)
        with Locations((-25.024244569, 119.343241944)):
            Circle(SKETCH_1_R, mode=Mode.SUBTRACT)
        with Locations((-16.46260808, 78.511901277)):
            Circle(SKETCH_1_R_5, mode=Mode.SUBTRACT)
        with BuildLine():
            Line((-20.727239862, 99.346486961), (4.367776805, 82.907504679))
            ThreePointArc((4.367776805, 82.907504679), (4.944845764, 80.138571416), (2.175912501, 79.561502457))
            Line((2.175912501, 79.561502457), (-22.919104167, 96.000484738))
            ThreePointArc((-22.919104167, 96.000484738), (-23.496173126, 98.769418002), (-20.727239862, 99.346486961))
        make_face(mode=Mode.SUBTRACT)
        with BuildLine():
            Line((-18.469699209, 112.103832748), (14.990323014, 90.185189705))
            ThreePointArc((14.990323014, 90.185189705), (15.567391973, 87.416256442), (12.79845871, 86.839187483))
            Line((12.79845871, 86.839187483), (-20.661563513, 108.757830525))
            ThreePointArc((-20.661563513, 108.757830525), (-21.238632472, 111.526763789), (-18.469699209, 112.103832748))
        make_face(mode=Mode.SUBTRACT)
        with Locations((24.368732586, 87.073537766)):
            Circle(SKETCH_1_R_6, mode=Mode.SUBTRACT)
        with BuildLine():
            Line((-18.543266566, 130.083575612), (31.646766769, 97.205611048))
            ThreePointArc((31.646766769, 97.205611048), (32.223835728, 94.436677785), (29.454902465, 93.859608826))
            Line((29.454902465, 93.859608826), (-20.73513087, 126.737573389))
            ThreePointArc((-20.73513087, 126.737573389), (-21.312199829, 129.506506653), (-18.543266566, 130.083575612))
        make_face(mode=Mode.SUBTRACT)
        with Locations((39.677111648, 109.590831797)):
            Circle(SKETCH_1_R_3, mode=Mode.SUBTRACT)
        with Locations((-10.553034612, 142.407480114)):
            Circle(SKETCH_1_R_3, mode=Mode.SUBTRACT)
        with Locations((14.562038518, 125.999155956)):
            Circle(SKETCH_1_R_7, mode=Mode.SUBTRACT)
    extrude(amount=EXTRUDE_1_DEPTH)

    # 圆角1
    fillet_1_edges = [part.edges().sort_by_distance(p)[0] for p in [
        (71.75669201, 78.511901277, 1),
        (18.778034519, -2.362952773, 1),
        (-104.68190817, 78.511901277, 1),
        (-51.703250679, 159.386755327, 1),
    ]]
    fillet(fillet_1_edges, radius=FILLET_1_R)


solid = part.part
